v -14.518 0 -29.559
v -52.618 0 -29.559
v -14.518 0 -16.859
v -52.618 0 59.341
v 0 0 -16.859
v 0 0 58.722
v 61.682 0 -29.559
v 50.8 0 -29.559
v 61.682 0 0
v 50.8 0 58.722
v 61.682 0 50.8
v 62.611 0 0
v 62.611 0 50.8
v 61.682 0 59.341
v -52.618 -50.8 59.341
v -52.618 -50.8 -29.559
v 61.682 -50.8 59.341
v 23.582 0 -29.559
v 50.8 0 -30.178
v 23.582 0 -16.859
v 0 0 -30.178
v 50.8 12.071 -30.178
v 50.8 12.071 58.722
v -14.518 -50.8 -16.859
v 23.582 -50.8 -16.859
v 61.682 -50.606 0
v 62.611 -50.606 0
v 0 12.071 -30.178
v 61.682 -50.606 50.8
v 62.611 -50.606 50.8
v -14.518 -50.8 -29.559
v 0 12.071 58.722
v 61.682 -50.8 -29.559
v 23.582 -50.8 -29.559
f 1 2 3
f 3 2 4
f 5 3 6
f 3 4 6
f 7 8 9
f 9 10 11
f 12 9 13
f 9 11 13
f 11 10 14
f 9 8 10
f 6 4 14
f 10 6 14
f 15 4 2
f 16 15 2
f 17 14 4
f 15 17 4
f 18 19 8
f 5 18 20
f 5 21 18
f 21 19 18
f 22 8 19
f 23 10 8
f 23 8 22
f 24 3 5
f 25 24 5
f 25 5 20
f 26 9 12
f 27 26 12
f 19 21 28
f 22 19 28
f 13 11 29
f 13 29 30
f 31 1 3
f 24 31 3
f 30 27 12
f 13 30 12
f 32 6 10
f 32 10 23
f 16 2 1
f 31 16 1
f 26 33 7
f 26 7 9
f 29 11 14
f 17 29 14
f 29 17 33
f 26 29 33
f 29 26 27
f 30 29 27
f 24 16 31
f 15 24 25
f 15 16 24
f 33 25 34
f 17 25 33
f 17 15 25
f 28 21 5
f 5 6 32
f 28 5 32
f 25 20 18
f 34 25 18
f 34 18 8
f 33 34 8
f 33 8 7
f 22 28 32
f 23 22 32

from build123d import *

# Parameters (mm, degrees)
F1_DEPTH = 50.8
F2_W     = 12.071142
F2_H     = 88.9
F3_DEPTH = 50.8
F4_W     = 114.3
F4_H     = 50.605938
F5_DEPTH = 50.8


with BuildPart() as f1:
    # F0 (on Front) → F1 (new body)
    with BuildSketch(Plane.XZ):
        Polygon((61.682204, 59.341179), (-52.617796, 59.341179), (-52.617796, -29.558821), (-14.517796, -29.558821), (-14.517796, -16.858821), (23.582204, -16.858821), (23.582204, -29.558821), (61.682204, -29.558821), align=None)
    extrude(amount=F1_DEPTH)

    # F2 (on Right) → F3 (join)
    with BuildSketch(Plane.YZ):
        with Locations((6.035571, 14.272146)):
            Rectangle(F2_W, F2_H)
    extrude(amount=F3_DEPTH)

    # F4 (on Top) → F5 (join)
    with BuildSketch(Plane.XY):
        with Locations((5.460755, -25.302969)):
            Rectangle(F4_W, F4_H)
    extrude(amount=F5_DEPTH)


solid = f1.part
